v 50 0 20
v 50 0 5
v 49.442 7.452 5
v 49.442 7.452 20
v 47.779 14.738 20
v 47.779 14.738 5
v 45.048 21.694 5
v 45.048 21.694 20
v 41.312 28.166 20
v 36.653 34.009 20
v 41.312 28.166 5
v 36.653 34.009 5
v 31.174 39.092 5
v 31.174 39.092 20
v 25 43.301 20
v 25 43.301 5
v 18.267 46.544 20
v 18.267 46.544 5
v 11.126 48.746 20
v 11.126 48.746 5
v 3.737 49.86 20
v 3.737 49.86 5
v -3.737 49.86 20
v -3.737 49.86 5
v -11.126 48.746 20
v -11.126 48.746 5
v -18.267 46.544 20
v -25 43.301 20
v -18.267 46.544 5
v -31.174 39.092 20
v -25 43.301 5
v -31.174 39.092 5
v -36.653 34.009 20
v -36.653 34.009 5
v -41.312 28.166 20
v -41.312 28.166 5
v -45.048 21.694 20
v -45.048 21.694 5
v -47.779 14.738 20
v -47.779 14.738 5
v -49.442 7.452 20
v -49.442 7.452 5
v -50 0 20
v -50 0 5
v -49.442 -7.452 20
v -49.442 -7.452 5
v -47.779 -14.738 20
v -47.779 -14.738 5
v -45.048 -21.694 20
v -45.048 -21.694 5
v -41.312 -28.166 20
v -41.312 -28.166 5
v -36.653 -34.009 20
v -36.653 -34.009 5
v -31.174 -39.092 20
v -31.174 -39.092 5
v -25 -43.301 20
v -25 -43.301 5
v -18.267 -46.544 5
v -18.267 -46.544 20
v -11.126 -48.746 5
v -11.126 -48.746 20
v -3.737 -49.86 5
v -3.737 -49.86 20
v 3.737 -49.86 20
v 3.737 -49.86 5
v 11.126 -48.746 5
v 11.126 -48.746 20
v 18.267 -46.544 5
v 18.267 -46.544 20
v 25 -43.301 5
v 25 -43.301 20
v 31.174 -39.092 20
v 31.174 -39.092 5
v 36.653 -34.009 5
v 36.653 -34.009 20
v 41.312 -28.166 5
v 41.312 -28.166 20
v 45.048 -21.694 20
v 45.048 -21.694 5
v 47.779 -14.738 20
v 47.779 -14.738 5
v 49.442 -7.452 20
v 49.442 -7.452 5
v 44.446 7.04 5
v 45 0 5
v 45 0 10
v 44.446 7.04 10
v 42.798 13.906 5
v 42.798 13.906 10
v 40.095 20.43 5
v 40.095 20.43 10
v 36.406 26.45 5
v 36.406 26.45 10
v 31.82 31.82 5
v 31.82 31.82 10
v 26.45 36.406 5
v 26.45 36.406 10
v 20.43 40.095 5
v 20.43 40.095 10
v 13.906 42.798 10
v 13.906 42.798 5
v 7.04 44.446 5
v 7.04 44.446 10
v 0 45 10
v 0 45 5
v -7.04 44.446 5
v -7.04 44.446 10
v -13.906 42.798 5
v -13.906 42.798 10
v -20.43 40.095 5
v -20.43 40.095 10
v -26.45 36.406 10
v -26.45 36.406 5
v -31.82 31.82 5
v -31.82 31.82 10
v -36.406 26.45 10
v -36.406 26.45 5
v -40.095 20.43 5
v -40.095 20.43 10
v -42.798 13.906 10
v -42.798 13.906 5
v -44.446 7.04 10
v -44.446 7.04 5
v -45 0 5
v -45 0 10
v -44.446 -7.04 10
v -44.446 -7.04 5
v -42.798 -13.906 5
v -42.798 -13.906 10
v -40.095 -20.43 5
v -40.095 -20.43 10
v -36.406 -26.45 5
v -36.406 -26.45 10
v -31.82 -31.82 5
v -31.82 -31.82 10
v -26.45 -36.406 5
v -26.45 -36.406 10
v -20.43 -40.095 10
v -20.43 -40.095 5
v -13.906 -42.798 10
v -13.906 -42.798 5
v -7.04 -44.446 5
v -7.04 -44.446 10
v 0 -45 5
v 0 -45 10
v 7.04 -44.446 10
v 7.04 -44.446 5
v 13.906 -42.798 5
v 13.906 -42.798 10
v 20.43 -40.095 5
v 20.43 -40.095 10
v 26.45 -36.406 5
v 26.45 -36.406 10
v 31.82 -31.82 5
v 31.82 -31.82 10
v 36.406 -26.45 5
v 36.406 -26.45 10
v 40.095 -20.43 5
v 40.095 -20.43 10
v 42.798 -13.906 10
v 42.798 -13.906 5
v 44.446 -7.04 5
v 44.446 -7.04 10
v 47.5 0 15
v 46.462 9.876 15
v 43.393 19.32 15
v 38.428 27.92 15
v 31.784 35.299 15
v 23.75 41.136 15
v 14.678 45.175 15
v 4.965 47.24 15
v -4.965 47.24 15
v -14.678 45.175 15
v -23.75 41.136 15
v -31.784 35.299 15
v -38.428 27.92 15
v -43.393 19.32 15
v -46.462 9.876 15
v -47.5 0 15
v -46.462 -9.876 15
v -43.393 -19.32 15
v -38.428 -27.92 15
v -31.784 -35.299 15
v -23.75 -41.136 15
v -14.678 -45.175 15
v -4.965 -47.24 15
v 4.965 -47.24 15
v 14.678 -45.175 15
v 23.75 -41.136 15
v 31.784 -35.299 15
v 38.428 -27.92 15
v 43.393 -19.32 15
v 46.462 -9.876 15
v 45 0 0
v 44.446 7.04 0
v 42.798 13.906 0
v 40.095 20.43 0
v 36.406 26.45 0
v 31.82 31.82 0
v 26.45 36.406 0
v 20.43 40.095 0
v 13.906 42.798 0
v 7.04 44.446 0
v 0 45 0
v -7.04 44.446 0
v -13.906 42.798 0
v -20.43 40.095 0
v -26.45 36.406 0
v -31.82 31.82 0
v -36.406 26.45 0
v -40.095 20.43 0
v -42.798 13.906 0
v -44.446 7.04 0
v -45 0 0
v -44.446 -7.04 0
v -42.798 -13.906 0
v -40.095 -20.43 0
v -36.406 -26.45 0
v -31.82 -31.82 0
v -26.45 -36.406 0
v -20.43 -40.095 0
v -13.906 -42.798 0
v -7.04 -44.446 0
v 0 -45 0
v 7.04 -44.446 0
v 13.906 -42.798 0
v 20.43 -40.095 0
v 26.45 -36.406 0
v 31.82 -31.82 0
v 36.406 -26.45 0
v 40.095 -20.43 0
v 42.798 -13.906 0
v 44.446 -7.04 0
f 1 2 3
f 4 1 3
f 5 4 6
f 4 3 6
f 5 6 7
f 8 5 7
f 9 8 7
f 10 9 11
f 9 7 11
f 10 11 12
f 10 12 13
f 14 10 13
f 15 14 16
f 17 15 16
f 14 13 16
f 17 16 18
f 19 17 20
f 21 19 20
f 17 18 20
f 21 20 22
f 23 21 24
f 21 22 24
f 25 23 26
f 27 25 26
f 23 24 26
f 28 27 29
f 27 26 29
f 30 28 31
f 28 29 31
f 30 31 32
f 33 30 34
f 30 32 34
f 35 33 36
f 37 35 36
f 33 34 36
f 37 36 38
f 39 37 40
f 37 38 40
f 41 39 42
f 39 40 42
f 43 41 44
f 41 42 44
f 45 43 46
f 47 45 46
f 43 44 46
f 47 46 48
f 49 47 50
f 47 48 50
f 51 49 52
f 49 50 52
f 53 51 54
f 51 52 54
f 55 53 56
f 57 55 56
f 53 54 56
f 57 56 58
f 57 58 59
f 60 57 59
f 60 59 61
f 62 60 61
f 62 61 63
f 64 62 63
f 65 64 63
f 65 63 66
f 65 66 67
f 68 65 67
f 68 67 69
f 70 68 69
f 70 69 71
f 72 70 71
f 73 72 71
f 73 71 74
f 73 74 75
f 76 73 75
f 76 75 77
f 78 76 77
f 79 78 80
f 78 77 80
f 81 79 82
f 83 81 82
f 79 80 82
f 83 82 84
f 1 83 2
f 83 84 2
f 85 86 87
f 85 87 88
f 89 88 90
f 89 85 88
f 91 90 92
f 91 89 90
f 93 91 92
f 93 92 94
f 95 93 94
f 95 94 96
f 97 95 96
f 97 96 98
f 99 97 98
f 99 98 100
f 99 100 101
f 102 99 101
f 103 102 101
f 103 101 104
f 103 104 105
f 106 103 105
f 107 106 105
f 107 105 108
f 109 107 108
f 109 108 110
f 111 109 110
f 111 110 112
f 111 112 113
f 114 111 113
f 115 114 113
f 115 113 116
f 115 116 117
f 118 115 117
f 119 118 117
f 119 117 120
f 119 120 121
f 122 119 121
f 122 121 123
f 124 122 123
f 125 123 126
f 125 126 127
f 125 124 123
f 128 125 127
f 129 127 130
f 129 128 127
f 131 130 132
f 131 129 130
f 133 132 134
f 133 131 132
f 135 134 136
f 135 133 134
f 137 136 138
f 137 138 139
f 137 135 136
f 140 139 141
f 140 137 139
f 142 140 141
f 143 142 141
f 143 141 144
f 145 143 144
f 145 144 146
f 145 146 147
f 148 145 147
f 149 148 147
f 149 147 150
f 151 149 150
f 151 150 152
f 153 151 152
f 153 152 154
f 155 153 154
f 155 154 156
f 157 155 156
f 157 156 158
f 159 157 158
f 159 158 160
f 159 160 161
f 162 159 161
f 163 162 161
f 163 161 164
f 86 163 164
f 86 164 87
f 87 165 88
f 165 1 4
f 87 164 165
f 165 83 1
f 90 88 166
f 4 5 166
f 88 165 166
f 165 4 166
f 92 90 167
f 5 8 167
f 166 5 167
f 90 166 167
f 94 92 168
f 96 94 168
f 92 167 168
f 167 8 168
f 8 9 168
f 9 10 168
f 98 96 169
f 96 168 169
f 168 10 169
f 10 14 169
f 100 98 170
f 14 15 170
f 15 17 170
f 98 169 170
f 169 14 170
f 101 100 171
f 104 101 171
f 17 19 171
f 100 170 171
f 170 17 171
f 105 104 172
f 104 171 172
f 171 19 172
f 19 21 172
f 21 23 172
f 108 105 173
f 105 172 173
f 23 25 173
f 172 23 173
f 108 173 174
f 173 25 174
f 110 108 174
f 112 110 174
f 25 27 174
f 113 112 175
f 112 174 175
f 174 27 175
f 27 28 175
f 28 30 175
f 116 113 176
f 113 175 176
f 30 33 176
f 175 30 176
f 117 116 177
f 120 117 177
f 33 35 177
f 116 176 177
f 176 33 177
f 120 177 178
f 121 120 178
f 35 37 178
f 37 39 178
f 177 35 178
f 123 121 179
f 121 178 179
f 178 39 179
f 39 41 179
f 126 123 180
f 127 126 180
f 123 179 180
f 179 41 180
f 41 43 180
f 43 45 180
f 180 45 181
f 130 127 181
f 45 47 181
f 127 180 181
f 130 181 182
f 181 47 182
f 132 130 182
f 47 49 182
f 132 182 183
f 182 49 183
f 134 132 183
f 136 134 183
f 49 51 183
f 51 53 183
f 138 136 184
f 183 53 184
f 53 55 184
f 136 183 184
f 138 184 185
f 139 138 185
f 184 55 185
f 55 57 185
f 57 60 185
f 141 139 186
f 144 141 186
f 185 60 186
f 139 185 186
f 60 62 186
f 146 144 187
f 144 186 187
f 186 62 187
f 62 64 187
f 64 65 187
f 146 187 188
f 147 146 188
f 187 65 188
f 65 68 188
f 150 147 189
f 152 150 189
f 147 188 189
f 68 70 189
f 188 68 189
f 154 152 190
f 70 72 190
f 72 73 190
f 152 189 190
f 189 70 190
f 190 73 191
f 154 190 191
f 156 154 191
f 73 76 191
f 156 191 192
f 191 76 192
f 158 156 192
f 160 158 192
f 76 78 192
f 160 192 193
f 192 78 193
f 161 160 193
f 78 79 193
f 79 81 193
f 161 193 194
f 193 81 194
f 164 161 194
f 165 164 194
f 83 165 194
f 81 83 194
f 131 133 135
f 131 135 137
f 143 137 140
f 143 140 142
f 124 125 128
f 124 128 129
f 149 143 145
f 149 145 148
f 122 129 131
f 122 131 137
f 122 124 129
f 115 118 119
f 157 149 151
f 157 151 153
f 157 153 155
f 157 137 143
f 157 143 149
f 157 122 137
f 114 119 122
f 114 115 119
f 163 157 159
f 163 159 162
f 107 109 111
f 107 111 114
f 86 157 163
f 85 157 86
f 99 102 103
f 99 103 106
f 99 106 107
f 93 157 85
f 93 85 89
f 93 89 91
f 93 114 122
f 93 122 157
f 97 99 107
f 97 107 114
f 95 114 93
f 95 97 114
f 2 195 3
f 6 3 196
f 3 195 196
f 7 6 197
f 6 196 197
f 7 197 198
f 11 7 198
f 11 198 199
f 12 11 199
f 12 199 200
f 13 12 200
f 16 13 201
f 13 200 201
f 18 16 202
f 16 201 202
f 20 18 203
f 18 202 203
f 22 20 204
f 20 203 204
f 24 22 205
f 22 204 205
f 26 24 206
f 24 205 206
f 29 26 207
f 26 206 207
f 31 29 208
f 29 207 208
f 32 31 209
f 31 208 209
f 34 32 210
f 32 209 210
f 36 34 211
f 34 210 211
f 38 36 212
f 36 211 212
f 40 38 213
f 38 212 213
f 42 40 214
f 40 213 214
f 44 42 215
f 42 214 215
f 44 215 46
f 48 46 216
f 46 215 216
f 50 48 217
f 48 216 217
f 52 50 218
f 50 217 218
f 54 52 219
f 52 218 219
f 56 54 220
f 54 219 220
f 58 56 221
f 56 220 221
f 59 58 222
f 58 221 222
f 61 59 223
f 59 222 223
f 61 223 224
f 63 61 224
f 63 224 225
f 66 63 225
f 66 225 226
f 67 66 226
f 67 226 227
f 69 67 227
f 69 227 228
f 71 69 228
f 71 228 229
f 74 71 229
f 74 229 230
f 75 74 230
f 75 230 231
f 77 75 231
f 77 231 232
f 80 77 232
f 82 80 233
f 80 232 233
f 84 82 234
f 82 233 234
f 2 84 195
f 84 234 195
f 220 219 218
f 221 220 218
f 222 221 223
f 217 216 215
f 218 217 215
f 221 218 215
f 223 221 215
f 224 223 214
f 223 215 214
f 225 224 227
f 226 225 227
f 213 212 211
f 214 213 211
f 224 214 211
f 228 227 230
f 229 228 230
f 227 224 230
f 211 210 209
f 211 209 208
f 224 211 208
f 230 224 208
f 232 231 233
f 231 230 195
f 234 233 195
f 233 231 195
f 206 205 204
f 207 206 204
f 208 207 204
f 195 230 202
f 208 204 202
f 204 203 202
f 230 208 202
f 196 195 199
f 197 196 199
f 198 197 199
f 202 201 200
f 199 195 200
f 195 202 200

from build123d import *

# Parameters (mm, degrees)
F0_R     = 45
F1_DEPTH = 5
F0_R_2   = 50
F2_DEPTH = 20
F3_SIZE2 = 5
F3_SIZE  = 5
F4_SIZE2 = 4.99999
F4_SIZE  = 9.99999


# Not quite as in the source:
# - a fillet or chamfer is up to 0.001 mm smaller than in the source, because OpenCascade refuses the exact size
# - a feature of the source that left no trace in its solid (it failed there, or was rolled back) is left out


with BuildPart() as f1:
    # F0 (on Top) → F1 (new body)
    with BuildSketch(Plane.XY):
        Circle(F0_R)
    extrude(amount=F1_DEPTH)

    # F0 (on Top) → F2 (join)
    with BuildSketch(Plane.XY):
        Circle(F0_R_2)
        Circle(F0_R, mode=Mode.SUBTRACT)
    extrude(amount=F2_DEPTH)

    # F3
    f3_edges = [f1.edges().sort_by_distance(p)[0] for p in [
        (-50, 0, 0),
    ]]
    chamfer(f3_edges, length=F3_SIZE, length2=F3_SIZE2)

    # F4 (size 10 and 5 in the source; OpenCascade refuses exactly that, so slightly less here)
    f4_edges = [f1.edges().sort_by_distance(p)[0] for p in [
        (-45, 0, 20),
    ]]
    f4_side = f1.faces().sort_by_distance((-45, 0, 12.5))[0]
    chamfer(f4_edges, length=F4_SIZE, length2=F4_SIZE2, reference=f4_side)


solid = f1.part
